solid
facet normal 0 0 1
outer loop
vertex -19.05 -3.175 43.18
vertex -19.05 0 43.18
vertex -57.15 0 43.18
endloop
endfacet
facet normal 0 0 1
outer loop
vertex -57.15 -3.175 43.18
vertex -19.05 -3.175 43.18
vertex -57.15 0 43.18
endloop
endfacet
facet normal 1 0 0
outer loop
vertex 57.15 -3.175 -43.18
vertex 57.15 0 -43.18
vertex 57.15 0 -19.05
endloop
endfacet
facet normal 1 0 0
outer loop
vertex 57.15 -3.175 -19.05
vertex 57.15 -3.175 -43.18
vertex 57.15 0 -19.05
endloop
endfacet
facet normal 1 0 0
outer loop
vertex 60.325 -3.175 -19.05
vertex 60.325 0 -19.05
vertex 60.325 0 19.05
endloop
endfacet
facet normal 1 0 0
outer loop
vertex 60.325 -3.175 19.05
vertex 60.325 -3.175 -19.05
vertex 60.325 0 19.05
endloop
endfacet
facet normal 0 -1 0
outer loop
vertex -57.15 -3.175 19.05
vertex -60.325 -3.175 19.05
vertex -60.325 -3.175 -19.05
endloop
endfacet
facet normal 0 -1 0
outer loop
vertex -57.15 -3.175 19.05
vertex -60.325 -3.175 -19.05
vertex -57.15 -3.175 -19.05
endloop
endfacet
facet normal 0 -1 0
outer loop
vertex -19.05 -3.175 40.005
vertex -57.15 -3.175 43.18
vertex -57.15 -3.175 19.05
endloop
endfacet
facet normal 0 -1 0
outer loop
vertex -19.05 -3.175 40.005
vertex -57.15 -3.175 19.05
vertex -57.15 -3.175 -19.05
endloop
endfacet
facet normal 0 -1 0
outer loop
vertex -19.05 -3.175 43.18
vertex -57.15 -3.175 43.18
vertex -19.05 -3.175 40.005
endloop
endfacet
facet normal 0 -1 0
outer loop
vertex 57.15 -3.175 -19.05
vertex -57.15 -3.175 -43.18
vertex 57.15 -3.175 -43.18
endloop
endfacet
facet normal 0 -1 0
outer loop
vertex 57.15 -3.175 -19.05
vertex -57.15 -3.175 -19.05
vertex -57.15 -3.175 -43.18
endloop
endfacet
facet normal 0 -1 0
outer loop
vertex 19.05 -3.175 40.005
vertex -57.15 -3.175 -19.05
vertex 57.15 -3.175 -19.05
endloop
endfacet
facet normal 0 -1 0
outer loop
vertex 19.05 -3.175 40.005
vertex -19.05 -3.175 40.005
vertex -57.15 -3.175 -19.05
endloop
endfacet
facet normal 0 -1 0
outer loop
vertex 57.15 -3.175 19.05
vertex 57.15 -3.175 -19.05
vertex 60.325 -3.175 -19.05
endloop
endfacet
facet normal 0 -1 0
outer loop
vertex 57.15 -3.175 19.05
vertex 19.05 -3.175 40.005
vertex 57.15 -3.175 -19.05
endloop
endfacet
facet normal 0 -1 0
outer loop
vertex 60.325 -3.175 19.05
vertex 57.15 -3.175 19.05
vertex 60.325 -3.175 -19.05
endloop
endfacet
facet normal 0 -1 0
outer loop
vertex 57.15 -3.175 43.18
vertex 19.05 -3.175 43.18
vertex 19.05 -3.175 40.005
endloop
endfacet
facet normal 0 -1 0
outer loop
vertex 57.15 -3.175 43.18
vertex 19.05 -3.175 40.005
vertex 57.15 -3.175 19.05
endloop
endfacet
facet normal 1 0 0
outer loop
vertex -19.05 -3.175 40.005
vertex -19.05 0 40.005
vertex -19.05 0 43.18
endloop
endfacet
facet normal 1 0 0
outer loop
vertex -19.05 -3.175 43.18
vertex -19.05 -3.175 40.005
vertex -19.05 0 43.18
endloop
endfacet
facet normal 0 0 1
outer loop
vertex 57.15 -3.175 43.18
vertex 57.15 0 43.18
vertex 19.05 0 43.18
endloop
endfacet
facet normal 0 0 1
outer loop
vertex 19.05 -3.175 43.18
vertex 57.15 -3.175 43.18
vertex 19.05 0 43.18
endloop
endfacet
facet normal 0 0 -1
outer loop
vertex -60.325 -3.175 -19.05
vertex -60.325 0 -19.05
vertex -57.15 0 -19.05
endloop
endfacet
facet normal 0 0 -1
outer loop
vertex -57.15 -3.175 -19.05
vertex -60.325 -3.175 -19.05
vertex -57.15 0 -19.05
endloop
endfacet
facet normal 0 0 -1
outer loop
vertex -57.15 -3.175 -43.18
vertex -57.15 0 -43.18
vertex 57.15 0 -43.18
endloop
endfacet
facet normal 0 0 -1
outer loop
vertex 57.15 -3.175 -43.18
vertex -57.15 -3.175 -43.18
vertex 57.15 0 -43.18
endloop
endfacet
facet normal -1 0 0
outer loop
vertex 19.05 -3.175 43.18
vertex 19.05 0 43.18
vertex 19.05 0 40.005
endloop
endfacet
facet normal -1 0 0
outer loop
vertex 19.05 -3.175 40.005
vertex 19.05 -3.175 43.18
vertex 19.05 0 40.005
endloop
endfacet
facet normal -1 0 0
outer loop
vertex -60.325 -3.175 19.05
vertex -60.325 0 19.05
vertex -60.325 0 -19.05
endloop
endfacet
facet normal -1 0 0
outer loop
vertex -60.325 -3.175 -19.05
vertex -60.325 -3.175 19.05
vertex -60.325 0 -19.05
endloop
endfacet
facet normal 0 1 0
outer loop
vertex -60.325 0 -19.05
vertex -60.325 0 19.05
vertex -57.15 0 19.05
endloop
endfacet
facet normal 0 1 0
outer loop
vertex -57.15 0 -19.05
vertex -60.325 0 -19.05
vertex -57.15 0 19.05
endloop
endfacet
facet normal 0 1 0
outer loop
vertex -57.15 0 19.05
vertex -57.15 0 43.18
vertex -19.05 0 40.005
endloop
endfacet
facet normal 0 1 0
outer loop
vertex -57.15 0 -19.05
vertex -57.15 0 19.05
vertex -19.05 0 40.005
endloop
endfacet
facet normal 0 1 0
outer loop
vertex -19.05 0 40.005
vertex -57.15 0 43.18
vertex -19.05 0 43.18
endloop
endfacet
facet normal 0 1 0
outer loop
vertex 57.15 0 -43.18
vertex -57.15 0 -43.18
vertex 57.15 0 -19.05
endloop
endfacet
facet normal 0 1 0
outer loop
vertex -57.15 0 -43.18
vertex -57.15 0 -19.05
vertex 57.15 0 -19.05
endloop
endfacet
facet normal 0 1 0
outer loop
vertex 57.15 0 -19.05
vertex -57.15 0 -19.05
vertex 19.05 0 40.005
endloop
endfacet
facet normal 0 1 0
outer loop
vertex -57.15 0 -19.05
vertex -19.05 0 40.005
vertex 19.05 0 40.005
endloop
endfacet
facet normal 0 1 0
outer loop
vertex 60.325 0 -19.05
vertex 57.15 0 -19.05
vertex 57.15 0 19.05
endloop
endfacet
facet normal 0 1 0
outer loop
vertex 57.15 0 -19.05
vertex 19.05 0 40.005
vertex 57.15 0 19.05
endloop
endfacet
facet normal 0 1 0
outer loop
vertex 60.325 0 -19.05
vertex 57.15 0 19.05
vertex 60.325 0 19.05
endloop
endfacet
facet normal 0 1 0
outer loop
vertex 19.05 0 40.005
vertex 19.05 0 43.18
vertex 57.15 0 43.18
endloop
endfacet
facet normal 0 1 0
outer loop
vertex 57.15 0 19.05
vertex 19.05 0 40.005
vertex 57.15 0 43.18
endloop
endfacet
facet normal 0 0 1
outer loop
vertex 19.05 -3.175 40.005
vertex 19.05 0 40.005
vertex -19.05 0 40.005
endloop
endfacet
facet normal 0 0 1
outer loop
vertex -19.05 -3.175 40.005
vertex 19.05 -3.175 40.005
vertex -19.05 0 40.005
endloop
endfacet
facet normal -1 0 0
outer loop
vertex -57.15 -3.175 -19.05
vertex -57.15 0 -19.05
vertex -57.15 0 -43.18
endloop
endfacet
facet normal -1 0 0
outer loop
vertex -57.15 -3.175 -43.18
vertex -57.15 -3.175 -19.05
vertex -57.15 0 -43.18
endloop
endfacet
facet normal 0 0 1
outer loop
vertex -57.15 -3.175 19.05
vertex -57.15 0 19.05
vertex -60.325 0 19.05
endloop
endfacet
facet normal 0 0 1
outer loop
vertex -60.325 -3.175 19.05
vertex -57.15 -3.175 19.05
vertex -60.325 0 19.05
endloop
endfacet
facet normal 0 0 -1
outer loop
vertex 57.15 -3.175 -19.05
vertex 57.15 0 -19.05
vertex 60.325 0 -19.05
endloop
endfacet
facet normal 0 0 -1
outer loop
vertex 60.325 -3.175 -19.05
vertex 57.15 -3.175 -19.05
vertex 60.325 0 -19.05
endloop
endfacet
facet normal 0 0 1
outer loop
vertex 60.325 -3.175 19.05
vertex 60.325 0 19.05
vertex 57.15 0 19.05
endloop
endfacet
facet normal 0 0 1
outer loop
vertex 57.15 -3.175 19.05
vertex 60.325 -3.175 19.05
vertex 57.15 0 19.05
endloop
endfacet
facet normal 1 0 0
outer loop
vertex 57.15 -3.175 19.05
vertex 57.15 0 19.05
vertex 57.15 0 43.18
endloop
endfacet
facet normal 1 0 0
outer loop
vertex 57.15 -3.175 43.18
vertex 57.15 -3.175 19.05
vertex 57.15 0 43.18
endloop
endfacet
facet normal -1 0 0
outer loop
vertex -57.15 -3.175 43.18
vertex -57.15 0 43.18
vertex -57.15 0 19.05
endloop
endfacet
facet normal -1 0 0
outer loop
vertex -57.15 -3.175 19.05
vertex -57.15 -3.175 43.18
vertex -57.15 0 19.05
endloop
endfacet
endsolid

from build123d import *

# Parameters (mm, degrees)
F1_DEPTH = 3.175


# Not quite as in the source:
# - a feature names something its author has since deleted; it is built from what else it names


with BuildPart() as f1:
    # F0 (on Front) → F1 (new body)
    with BuildSketch(Plane.XZ):
        Polygon((-57.15, -43.18), (57.15, -43.18), (57.15, -19.05), (60.325, -19.05), (60.325, 19.05), (57.15, 19.05), (57.15, 43.18), (19.05, 43.18), (19.05, 40.005), (-19.05, 40.005), (-19.05, 43.18), (-57.15, 43.18), (-57.15, 19.05), (-60.325, 19.05), (-60.325, 0), (-60.325, -19.05), (-57.15, -19.05), align=None)
    extrude(amount=F1_DEPTH)


solid = f1.part
